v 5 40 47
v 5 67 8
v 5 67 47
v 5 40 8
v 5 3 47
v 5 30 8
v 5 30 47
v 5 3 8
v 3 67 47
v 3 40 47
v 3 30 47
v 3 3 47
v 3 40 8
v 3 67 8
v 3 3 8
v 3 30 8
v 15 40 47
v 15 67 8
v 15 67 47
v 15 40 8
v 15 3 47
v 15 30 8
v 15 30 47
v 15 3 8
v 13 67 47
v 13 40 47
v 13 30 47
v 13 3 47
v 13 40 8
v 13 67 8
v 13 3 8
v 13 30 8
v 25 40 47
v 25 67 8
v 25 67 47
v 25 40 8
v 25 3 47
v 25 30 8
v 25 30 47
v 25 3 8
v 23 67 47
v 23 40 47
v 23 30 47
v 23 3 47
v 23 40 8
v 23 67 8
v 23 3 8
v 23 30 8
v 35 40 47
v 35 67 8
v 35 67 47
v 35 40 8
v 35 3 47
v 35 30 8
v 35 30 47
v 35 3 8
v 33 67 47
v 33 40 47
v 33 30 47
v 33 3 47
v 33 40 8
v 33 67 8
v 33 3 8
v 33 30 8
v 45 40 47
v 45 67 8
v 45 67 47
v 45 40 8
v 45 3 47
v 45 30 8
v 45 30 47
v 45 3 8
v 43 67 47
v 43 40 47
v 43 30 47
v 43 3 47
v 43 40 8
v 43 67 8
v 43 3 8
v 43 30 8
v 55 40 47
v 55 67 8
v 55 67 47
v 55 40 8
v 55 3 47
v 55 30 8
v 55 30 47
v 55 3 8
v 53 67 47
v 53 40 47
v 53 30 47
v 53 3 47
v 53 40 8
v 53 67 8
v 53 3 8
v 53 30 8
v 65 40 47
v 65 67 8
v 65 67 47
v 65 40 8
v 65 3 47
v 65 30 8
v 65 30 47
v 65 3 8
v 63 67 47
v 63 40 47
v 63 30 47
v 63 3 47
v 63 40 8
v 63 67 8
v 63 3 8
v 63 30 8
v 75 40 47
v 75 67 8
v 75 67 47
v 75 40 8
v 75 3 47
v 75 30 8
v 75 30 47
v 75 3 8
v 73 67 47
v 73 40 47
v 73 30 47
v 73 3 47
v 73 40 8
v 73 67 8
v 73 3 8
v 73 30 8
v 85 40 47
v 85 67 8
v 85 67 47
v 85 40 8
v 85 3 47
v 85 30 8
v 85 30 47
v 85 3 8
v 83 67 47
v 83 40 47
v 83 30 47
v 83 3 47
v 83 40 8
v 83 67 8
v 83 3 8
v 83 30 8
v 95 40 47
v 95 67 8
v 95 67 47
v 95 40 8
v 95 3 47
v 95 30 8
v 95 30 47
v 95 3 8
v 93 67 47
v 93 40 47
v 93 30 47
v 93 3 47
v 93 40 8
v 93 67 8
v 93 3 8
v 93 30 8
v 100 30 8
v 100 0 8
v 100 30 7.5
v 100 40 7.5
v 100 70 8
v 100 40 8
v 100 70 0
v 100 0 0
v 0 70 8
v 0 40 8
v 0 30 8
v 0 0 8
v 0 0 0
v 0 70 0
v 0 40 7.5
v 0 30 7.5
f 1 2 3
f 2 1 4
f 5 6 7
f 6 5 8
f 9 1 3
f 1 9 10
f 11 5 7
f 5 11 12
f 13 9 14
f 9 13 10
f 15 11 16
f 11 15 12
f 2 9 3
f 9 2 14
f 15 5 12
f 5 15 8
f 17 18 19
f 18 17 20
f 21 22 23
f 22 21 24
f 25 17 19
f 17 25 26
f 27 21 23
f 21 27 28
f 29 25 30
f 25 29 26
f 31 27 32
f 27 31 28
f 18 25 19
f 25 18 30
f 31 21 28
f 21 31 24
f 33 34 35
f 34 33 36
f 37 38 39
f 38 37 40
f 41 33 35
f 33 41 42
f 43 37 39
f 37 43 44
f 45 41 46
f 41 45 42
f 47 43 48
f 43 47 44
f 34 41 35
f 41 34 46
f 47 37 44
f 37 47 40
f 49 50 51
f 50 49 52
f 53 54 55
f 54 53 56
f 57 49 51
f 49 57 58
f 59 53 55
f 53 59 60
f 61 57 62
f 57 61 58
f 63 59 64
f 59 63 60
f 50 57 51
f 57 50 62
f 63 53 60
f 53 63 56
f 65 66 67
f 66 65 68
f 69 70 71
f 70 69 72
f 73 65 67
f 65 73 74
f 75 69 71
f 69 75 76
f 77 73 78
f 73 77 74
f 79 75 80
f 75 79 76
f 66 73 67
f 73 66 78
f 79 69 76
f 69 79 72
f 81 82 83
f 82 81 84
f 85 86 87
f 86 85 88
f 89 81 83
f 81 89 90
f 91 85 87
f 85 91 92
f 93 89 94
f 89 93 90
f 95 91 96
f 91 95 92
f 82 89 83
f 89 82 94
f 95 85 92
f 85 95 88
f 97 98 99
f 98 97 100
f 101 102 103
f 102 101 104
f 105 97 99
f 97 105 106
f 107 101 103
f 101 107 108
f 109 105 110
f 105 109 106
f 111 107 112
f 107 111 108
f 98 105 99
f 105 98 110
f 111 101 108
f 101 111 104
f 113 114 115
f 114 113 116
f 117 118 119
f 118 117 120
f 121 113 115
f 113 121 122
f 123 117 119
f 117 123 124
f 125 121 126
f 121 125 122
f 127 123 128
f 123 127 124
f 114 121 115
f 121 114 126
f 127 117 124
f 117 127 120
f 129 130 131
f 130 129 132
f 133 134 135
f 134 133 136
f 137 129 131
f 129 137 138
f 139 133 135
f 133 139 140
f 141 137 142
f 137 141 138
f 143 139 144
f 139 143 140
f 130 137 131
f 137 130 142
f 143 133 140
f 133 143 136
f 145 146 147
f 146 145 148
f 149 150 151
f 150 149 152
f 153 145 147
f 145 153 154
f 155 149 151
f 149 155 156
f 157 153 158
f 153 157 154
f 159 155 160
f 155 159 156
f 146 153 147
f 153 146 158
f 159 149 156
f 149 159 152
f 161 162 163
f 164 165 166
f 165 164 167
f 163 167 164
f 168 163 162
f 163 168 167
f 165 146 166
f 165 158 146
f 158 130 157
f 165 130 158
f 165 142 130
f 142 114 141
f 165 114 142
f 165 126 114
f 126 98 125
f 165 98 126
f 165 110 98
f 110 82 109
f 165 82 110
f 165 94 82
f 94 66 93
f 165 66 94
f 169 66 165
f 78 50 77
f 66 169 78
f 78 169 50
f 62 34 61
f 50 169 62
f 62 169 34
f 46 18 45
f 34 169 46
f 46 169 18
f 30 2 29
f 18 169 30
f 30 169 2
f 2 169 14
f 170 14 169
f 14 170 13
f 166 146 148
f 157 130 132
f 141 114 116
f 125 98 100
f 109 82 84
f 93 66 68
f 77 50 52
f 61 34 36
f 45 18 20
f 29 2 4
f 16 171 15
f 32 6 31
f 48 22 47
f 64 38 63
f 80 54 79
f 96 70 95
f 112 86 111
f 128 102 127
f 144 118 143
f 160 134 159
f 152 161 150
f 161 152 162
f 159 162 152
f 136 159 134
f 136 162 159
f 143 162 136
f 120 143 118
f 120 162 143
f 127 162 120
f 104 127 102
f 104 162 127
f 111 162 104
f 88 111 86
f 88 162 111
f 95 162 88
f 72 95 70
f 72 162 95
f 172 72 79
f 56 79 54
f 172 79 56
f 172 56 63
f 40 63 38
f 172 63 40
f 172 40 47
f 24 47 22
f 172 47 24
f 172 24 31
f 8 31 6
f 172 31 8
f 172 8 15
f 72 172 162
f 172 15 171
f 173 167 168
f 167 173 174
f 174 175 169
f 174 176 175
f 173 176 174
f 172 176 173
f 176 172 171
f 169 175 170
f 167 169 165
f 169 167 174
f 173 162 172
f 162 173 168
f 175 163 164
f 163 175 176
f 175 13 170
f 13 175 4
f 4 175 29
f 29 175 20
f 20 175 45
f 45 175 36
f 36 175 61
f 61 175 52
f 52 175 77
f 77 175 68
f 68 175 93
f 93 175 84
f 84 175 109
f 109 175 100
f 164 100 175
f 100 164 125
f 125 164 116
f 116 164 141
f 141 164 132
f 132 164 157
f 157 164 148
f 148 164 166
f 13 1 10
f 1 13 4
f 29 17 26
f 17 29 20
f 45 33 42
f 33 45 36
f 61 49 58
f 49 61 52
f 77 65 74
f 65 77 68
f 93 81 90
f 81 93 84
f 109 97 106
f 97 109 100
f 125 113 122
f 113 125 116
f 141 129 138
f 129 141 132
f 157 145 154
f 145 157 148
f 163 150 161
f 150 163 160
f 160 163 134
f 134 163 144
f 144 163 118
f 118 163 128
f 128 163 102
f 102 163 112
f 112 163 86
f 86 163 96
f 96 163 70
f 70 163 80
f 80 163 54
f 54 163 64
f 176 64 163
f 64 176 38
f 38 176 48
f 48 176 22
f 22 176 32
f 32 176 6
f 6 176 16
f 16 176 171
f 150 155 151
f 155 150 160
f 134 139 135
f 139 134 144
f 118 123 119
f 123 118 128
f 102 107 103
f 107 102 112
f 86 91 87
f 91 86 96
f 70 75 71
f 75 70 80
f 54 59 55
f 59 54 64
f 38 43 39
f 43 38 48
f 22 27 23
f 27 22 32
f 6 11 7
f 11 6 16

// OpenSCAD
$fn = 32;

// ----------------------------------------------------------------------
// Heatsink: slotted fin block
// ----------------------------------------------------------------------

// --- parameters (mm) ---
base_l = 100;             // base length, X
base_w = 70;              // base width, Y
base_t = 8;               // base plate thickness
fin_h = 40;               // fin height above the base
fin_t = 2;                // fin thickness
edge = 3;                 // margin from the base ends
pitch = 10;               // fin pitch
slot_w = 10;              // central slot width, Y

n_fins = floor((base_l - 2 * edge - fin_t) / pitch) + 1;  // fin count
total_h = base_t + fin_h - 1;  // overall height

difference() {
union() {
  cube([base_l, base_w, base_t]);
  for (i = [0 : n_fins - 1])
    translate([edge + i * pitch, edge, base_t - 1])
      cube([fin_t, base_w - 2 * edge, fin_h]);
}
  translate([-1, base_w / 2 - slot_w / 2, base_t - 0.5])
    cube([base_l + 2, slot_w, fin_h + 2]);
}
